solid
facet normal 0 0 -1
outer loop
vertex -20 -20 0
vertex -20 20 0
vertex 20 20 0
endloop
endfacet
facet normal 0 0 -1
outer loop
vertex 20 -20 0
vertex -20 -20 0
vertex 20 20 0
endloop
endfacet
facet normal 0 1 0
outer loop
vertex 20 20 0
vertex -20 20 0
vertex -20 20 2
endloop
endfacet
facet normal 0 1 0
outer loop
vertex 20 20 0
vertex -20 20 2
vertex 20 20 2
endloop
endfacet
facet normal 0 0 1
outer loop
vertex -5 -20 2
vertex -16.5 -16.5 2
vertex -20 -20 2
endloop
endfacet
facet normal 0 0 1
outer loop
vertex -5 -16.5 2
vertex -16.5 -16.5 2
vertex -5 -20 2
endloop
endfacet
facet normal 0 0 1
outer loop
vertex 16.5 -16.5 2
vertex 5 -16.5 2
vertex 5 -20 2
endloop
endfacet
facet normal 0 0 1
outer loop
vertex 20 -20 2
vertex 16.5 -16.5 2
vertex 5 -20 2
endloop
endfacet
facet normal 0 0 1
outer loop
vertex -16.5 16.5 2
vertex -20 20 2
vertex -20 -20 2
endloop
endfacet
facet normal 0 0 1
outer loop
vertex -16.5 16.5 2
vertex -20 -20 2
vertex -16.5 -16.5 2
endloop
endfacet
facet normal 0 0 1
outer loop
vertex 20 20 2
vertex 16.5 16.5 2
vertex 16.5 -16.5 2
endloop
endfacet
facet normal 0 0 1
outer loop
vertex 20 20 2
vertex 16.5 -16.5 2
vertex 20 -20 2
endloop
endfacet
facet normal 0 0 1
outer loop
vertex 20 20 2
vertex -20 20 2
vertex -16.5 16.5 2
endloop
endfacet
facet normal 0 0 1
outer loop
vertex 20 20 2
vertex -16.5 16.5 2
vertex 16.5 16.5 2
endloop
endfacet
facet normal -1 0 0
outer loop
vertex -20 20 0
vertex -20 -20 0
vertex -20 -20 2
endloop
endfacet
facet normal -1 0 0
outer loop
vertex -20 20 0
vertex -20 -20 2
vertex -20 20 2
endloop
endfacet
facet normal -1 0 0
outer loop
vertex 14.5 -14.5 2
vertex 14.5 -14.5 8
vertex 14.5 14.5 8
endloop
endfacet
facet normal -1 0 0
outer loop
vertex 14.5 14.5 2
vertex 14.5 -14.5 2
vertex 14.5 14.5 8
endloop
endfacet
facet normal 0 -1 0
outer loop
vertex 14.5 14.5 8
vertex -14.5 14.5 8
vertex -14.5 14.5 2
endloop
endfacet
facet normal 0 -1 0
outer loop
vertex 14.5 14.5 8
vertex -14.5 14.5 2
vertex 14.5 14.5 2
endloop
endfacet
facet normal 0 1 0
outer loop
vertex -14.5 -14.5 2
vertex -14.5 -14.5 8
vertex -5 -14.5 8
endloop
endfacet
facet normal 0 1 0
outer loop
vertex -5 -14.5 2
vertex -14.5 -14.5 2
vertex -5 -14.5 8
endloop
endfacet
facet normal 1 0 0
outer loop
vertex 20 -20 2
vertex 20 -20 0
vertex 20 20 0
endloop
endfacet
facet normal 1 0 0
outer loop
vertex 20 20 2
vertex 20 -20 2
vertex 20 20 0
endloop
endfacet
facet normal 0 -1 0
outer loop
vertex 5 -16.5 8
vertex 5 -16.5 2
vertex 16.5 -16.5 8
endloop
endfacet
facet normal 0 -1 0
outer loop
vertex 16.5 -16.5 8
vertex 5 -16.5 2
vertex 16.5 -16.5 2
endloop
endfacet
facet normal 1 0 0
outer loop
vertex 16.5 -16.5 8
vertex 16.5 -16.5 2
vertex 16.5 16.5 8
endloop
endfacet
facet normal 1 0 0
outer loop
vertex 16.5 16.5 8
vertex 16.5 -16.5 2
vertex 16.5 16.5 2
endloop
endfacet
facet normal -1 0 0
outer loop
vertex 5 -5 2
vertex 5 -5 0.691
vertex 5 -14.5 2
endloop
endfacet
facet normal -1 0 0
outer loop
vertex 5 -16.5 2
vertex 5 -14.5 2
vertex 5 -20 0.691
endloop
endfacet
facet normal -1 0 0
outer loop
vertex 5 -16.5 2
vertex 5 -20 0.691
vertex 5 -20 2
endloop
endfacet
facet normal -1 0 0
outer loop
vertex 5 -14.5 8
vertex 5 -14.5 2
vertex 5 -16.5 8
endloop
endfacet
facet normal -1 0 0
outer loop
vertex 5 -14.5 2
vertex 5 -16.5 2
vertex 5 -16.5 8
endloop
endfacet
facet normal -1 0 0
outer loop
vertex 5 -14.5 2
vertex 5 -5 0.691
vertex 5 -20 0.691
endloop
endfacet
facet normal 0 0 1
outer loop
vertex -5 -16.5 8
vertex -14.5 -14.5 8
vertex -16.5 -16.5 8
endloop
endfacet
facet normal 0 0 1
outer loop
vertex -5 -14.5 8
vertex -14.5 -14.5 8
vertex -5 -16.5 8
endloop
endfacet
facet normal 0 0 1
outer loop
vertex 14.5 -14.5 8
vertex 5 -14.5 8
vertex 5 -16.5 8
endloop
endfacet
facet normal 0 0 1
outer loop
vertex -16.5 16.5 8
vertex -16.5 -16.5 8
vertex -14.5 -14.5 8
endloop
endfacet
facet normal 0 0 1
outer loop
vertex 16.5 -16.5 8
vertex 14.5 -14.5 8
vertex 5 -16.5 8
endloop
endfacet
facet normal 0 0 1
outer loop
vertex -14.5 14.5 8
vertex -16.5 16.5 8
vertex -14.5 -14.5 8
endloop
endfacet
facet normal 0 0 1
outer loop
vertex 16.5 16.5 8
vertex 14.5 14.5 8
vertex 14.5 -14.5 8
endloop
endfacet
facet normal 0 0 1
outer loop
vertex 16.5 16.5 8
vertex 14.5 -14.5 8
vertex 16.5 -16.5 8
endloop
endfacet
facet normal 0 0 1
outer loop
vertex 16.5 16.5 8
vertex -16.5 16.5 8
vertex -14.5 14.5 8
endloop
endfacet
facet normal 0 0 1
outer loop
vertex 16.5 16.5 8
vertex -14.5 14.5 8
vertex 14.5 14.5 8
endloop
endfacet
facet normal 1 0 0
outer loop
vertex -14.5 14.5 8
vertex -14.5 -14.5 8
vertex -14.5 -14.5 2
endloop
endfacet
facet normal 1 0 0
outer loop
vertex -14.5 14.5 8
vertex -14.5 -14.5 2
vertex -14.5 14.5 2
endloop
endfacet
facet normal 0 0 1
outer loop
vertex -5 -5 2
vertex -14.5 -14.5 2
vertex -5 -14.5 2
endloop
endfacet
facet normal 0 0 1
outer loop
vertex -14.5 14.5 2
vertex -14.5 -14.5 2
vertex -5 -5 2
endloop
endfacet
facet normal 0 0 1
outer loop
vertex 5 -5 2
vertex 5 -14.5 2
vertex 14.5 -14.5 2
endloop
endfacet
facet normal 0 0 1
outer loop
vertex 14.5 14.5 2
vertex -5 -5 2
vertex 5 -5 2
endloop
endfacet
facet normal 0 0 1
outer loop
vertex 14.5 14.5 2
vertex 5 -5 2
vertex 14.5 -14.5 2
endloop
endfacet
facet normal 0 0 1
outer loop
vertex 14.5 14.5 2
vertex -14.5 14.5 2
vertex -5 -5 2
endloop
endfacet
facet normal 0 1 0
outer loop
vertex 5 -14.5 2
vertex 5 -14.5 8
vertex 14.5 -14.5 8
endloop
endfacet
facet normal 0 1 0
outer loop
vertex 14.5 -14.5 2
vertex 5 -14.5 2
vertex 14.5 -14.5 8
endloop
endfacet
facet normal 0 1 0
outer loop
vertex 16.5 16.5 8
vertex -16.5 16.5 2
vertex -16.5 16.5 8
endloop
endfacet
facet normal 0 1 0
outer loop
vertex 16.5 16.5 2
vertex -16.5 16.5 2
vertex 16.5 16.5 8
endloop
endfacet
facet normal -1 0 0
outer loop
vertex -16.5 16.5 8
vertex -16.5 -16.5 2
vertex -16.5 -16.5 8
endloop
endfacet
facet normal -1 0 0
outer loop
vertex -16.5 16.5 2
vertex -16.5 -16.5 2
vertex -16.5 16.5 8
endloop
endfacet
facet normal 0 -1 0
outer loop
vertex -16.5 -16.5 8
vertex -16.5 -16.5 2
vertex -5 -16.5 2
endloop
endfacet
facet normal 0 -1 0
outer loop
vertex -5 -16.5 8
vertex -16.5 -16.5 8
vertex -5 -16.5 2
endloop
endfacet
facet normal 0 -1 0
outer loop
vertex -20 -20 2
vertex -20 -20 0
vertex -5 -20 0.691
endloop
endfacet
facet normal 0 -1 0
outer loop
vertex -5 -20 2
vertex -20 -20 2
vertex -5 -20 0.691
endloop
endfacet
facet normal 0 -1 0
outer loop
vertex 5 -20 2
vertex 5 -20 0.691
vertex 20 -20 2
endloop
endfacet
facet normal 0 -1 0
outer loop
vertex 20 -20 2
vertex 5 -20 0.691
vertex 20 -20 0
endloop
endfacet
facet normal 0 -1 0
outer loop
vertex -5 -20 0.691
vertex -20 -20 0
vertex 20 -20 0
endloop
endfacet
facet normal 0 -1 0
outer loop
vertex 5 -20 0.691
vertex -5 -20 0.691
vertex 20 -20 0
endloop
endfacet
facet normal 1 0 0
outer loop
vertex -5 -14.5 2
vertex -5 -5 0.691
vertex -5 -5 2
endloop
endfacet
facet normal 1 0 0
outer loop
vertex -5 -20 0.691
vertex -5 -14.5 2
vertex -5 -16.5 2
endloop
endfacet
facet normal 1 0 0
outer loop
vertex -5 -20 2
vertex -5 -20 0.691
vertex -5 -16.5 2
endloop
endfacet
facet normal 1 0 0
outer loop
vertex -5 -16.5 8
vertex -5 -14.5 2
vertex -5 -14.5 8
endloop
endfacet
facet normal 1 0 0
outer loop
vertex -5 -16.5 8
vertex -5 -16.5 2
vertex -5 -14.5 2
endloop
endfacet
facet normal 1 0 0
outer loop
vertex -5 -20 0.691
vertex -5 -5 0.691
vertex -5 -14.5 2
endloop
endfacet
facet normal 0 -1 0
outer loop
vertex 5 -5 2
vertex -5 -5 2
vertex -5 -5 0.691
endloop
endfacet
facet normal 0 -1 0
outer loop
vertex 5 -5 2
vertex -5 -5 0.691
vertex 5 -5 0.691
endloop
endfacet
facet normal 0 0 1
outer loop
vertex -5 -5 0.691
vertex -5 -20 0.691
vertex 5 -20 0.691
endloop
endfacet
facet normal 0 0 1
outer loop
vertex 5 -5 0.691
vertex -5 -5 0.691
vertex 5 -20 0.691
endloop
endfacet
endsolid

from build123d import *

# Parameters (mm, degrees)
SKETCH_W        = 40
SKETCH_H        = 40
PAD_DEPTH       = 2
SKETCH001_W     = 33
SKETCH001_H     = 33
PAD001_DEPTH    = 6
SKETCH002_W     = 29
SKETCH002_H     = 29
POCKET_DEPTH    = 6
SKETCH003_W     = 10
SKETCH003_H     = 10
POCKET001_DEPTH = 15


with BuildPart() as part:
    # Sketch → Pad (new body)
    with BuildSketch(Plane.XY):
        Rectangle(SKETCH_W, SKETCH_H)
    extrude(amount=PAD_DEPTH)

    # Sketch001 (on Face6 of Pad) → Pad001 (join)
    with BuildSketch(Plane.XY.offset(2)):
        Rectangle(SKETCH001_W, SKETCH001_H)
    extrude(amount=PAD001_DEPTH)

    # Sketch002 (on Face11 of Pad001) → Pocket (cut)
    with BuildSketch(Plane.XY.offset(8)):
        Rectangle(SKETCH002_W, SKETCH002_H)
    extrude(amount=-POCKET_DEPTH, mode=Mode.SUBTRACT)

    # Sketch003 (on DatumPlane) → Pocket001 (cut)
    with BuildSketch(Plane.XZ.offset(20)):
        with Locations((0, 5.690688)):
            Rectangle(SKETCH003_W, SKETCH003_H)
    extrude(amount=-POCKET001_DEPTH, mode=Mode.SUBTRACT)


solid = part.part
